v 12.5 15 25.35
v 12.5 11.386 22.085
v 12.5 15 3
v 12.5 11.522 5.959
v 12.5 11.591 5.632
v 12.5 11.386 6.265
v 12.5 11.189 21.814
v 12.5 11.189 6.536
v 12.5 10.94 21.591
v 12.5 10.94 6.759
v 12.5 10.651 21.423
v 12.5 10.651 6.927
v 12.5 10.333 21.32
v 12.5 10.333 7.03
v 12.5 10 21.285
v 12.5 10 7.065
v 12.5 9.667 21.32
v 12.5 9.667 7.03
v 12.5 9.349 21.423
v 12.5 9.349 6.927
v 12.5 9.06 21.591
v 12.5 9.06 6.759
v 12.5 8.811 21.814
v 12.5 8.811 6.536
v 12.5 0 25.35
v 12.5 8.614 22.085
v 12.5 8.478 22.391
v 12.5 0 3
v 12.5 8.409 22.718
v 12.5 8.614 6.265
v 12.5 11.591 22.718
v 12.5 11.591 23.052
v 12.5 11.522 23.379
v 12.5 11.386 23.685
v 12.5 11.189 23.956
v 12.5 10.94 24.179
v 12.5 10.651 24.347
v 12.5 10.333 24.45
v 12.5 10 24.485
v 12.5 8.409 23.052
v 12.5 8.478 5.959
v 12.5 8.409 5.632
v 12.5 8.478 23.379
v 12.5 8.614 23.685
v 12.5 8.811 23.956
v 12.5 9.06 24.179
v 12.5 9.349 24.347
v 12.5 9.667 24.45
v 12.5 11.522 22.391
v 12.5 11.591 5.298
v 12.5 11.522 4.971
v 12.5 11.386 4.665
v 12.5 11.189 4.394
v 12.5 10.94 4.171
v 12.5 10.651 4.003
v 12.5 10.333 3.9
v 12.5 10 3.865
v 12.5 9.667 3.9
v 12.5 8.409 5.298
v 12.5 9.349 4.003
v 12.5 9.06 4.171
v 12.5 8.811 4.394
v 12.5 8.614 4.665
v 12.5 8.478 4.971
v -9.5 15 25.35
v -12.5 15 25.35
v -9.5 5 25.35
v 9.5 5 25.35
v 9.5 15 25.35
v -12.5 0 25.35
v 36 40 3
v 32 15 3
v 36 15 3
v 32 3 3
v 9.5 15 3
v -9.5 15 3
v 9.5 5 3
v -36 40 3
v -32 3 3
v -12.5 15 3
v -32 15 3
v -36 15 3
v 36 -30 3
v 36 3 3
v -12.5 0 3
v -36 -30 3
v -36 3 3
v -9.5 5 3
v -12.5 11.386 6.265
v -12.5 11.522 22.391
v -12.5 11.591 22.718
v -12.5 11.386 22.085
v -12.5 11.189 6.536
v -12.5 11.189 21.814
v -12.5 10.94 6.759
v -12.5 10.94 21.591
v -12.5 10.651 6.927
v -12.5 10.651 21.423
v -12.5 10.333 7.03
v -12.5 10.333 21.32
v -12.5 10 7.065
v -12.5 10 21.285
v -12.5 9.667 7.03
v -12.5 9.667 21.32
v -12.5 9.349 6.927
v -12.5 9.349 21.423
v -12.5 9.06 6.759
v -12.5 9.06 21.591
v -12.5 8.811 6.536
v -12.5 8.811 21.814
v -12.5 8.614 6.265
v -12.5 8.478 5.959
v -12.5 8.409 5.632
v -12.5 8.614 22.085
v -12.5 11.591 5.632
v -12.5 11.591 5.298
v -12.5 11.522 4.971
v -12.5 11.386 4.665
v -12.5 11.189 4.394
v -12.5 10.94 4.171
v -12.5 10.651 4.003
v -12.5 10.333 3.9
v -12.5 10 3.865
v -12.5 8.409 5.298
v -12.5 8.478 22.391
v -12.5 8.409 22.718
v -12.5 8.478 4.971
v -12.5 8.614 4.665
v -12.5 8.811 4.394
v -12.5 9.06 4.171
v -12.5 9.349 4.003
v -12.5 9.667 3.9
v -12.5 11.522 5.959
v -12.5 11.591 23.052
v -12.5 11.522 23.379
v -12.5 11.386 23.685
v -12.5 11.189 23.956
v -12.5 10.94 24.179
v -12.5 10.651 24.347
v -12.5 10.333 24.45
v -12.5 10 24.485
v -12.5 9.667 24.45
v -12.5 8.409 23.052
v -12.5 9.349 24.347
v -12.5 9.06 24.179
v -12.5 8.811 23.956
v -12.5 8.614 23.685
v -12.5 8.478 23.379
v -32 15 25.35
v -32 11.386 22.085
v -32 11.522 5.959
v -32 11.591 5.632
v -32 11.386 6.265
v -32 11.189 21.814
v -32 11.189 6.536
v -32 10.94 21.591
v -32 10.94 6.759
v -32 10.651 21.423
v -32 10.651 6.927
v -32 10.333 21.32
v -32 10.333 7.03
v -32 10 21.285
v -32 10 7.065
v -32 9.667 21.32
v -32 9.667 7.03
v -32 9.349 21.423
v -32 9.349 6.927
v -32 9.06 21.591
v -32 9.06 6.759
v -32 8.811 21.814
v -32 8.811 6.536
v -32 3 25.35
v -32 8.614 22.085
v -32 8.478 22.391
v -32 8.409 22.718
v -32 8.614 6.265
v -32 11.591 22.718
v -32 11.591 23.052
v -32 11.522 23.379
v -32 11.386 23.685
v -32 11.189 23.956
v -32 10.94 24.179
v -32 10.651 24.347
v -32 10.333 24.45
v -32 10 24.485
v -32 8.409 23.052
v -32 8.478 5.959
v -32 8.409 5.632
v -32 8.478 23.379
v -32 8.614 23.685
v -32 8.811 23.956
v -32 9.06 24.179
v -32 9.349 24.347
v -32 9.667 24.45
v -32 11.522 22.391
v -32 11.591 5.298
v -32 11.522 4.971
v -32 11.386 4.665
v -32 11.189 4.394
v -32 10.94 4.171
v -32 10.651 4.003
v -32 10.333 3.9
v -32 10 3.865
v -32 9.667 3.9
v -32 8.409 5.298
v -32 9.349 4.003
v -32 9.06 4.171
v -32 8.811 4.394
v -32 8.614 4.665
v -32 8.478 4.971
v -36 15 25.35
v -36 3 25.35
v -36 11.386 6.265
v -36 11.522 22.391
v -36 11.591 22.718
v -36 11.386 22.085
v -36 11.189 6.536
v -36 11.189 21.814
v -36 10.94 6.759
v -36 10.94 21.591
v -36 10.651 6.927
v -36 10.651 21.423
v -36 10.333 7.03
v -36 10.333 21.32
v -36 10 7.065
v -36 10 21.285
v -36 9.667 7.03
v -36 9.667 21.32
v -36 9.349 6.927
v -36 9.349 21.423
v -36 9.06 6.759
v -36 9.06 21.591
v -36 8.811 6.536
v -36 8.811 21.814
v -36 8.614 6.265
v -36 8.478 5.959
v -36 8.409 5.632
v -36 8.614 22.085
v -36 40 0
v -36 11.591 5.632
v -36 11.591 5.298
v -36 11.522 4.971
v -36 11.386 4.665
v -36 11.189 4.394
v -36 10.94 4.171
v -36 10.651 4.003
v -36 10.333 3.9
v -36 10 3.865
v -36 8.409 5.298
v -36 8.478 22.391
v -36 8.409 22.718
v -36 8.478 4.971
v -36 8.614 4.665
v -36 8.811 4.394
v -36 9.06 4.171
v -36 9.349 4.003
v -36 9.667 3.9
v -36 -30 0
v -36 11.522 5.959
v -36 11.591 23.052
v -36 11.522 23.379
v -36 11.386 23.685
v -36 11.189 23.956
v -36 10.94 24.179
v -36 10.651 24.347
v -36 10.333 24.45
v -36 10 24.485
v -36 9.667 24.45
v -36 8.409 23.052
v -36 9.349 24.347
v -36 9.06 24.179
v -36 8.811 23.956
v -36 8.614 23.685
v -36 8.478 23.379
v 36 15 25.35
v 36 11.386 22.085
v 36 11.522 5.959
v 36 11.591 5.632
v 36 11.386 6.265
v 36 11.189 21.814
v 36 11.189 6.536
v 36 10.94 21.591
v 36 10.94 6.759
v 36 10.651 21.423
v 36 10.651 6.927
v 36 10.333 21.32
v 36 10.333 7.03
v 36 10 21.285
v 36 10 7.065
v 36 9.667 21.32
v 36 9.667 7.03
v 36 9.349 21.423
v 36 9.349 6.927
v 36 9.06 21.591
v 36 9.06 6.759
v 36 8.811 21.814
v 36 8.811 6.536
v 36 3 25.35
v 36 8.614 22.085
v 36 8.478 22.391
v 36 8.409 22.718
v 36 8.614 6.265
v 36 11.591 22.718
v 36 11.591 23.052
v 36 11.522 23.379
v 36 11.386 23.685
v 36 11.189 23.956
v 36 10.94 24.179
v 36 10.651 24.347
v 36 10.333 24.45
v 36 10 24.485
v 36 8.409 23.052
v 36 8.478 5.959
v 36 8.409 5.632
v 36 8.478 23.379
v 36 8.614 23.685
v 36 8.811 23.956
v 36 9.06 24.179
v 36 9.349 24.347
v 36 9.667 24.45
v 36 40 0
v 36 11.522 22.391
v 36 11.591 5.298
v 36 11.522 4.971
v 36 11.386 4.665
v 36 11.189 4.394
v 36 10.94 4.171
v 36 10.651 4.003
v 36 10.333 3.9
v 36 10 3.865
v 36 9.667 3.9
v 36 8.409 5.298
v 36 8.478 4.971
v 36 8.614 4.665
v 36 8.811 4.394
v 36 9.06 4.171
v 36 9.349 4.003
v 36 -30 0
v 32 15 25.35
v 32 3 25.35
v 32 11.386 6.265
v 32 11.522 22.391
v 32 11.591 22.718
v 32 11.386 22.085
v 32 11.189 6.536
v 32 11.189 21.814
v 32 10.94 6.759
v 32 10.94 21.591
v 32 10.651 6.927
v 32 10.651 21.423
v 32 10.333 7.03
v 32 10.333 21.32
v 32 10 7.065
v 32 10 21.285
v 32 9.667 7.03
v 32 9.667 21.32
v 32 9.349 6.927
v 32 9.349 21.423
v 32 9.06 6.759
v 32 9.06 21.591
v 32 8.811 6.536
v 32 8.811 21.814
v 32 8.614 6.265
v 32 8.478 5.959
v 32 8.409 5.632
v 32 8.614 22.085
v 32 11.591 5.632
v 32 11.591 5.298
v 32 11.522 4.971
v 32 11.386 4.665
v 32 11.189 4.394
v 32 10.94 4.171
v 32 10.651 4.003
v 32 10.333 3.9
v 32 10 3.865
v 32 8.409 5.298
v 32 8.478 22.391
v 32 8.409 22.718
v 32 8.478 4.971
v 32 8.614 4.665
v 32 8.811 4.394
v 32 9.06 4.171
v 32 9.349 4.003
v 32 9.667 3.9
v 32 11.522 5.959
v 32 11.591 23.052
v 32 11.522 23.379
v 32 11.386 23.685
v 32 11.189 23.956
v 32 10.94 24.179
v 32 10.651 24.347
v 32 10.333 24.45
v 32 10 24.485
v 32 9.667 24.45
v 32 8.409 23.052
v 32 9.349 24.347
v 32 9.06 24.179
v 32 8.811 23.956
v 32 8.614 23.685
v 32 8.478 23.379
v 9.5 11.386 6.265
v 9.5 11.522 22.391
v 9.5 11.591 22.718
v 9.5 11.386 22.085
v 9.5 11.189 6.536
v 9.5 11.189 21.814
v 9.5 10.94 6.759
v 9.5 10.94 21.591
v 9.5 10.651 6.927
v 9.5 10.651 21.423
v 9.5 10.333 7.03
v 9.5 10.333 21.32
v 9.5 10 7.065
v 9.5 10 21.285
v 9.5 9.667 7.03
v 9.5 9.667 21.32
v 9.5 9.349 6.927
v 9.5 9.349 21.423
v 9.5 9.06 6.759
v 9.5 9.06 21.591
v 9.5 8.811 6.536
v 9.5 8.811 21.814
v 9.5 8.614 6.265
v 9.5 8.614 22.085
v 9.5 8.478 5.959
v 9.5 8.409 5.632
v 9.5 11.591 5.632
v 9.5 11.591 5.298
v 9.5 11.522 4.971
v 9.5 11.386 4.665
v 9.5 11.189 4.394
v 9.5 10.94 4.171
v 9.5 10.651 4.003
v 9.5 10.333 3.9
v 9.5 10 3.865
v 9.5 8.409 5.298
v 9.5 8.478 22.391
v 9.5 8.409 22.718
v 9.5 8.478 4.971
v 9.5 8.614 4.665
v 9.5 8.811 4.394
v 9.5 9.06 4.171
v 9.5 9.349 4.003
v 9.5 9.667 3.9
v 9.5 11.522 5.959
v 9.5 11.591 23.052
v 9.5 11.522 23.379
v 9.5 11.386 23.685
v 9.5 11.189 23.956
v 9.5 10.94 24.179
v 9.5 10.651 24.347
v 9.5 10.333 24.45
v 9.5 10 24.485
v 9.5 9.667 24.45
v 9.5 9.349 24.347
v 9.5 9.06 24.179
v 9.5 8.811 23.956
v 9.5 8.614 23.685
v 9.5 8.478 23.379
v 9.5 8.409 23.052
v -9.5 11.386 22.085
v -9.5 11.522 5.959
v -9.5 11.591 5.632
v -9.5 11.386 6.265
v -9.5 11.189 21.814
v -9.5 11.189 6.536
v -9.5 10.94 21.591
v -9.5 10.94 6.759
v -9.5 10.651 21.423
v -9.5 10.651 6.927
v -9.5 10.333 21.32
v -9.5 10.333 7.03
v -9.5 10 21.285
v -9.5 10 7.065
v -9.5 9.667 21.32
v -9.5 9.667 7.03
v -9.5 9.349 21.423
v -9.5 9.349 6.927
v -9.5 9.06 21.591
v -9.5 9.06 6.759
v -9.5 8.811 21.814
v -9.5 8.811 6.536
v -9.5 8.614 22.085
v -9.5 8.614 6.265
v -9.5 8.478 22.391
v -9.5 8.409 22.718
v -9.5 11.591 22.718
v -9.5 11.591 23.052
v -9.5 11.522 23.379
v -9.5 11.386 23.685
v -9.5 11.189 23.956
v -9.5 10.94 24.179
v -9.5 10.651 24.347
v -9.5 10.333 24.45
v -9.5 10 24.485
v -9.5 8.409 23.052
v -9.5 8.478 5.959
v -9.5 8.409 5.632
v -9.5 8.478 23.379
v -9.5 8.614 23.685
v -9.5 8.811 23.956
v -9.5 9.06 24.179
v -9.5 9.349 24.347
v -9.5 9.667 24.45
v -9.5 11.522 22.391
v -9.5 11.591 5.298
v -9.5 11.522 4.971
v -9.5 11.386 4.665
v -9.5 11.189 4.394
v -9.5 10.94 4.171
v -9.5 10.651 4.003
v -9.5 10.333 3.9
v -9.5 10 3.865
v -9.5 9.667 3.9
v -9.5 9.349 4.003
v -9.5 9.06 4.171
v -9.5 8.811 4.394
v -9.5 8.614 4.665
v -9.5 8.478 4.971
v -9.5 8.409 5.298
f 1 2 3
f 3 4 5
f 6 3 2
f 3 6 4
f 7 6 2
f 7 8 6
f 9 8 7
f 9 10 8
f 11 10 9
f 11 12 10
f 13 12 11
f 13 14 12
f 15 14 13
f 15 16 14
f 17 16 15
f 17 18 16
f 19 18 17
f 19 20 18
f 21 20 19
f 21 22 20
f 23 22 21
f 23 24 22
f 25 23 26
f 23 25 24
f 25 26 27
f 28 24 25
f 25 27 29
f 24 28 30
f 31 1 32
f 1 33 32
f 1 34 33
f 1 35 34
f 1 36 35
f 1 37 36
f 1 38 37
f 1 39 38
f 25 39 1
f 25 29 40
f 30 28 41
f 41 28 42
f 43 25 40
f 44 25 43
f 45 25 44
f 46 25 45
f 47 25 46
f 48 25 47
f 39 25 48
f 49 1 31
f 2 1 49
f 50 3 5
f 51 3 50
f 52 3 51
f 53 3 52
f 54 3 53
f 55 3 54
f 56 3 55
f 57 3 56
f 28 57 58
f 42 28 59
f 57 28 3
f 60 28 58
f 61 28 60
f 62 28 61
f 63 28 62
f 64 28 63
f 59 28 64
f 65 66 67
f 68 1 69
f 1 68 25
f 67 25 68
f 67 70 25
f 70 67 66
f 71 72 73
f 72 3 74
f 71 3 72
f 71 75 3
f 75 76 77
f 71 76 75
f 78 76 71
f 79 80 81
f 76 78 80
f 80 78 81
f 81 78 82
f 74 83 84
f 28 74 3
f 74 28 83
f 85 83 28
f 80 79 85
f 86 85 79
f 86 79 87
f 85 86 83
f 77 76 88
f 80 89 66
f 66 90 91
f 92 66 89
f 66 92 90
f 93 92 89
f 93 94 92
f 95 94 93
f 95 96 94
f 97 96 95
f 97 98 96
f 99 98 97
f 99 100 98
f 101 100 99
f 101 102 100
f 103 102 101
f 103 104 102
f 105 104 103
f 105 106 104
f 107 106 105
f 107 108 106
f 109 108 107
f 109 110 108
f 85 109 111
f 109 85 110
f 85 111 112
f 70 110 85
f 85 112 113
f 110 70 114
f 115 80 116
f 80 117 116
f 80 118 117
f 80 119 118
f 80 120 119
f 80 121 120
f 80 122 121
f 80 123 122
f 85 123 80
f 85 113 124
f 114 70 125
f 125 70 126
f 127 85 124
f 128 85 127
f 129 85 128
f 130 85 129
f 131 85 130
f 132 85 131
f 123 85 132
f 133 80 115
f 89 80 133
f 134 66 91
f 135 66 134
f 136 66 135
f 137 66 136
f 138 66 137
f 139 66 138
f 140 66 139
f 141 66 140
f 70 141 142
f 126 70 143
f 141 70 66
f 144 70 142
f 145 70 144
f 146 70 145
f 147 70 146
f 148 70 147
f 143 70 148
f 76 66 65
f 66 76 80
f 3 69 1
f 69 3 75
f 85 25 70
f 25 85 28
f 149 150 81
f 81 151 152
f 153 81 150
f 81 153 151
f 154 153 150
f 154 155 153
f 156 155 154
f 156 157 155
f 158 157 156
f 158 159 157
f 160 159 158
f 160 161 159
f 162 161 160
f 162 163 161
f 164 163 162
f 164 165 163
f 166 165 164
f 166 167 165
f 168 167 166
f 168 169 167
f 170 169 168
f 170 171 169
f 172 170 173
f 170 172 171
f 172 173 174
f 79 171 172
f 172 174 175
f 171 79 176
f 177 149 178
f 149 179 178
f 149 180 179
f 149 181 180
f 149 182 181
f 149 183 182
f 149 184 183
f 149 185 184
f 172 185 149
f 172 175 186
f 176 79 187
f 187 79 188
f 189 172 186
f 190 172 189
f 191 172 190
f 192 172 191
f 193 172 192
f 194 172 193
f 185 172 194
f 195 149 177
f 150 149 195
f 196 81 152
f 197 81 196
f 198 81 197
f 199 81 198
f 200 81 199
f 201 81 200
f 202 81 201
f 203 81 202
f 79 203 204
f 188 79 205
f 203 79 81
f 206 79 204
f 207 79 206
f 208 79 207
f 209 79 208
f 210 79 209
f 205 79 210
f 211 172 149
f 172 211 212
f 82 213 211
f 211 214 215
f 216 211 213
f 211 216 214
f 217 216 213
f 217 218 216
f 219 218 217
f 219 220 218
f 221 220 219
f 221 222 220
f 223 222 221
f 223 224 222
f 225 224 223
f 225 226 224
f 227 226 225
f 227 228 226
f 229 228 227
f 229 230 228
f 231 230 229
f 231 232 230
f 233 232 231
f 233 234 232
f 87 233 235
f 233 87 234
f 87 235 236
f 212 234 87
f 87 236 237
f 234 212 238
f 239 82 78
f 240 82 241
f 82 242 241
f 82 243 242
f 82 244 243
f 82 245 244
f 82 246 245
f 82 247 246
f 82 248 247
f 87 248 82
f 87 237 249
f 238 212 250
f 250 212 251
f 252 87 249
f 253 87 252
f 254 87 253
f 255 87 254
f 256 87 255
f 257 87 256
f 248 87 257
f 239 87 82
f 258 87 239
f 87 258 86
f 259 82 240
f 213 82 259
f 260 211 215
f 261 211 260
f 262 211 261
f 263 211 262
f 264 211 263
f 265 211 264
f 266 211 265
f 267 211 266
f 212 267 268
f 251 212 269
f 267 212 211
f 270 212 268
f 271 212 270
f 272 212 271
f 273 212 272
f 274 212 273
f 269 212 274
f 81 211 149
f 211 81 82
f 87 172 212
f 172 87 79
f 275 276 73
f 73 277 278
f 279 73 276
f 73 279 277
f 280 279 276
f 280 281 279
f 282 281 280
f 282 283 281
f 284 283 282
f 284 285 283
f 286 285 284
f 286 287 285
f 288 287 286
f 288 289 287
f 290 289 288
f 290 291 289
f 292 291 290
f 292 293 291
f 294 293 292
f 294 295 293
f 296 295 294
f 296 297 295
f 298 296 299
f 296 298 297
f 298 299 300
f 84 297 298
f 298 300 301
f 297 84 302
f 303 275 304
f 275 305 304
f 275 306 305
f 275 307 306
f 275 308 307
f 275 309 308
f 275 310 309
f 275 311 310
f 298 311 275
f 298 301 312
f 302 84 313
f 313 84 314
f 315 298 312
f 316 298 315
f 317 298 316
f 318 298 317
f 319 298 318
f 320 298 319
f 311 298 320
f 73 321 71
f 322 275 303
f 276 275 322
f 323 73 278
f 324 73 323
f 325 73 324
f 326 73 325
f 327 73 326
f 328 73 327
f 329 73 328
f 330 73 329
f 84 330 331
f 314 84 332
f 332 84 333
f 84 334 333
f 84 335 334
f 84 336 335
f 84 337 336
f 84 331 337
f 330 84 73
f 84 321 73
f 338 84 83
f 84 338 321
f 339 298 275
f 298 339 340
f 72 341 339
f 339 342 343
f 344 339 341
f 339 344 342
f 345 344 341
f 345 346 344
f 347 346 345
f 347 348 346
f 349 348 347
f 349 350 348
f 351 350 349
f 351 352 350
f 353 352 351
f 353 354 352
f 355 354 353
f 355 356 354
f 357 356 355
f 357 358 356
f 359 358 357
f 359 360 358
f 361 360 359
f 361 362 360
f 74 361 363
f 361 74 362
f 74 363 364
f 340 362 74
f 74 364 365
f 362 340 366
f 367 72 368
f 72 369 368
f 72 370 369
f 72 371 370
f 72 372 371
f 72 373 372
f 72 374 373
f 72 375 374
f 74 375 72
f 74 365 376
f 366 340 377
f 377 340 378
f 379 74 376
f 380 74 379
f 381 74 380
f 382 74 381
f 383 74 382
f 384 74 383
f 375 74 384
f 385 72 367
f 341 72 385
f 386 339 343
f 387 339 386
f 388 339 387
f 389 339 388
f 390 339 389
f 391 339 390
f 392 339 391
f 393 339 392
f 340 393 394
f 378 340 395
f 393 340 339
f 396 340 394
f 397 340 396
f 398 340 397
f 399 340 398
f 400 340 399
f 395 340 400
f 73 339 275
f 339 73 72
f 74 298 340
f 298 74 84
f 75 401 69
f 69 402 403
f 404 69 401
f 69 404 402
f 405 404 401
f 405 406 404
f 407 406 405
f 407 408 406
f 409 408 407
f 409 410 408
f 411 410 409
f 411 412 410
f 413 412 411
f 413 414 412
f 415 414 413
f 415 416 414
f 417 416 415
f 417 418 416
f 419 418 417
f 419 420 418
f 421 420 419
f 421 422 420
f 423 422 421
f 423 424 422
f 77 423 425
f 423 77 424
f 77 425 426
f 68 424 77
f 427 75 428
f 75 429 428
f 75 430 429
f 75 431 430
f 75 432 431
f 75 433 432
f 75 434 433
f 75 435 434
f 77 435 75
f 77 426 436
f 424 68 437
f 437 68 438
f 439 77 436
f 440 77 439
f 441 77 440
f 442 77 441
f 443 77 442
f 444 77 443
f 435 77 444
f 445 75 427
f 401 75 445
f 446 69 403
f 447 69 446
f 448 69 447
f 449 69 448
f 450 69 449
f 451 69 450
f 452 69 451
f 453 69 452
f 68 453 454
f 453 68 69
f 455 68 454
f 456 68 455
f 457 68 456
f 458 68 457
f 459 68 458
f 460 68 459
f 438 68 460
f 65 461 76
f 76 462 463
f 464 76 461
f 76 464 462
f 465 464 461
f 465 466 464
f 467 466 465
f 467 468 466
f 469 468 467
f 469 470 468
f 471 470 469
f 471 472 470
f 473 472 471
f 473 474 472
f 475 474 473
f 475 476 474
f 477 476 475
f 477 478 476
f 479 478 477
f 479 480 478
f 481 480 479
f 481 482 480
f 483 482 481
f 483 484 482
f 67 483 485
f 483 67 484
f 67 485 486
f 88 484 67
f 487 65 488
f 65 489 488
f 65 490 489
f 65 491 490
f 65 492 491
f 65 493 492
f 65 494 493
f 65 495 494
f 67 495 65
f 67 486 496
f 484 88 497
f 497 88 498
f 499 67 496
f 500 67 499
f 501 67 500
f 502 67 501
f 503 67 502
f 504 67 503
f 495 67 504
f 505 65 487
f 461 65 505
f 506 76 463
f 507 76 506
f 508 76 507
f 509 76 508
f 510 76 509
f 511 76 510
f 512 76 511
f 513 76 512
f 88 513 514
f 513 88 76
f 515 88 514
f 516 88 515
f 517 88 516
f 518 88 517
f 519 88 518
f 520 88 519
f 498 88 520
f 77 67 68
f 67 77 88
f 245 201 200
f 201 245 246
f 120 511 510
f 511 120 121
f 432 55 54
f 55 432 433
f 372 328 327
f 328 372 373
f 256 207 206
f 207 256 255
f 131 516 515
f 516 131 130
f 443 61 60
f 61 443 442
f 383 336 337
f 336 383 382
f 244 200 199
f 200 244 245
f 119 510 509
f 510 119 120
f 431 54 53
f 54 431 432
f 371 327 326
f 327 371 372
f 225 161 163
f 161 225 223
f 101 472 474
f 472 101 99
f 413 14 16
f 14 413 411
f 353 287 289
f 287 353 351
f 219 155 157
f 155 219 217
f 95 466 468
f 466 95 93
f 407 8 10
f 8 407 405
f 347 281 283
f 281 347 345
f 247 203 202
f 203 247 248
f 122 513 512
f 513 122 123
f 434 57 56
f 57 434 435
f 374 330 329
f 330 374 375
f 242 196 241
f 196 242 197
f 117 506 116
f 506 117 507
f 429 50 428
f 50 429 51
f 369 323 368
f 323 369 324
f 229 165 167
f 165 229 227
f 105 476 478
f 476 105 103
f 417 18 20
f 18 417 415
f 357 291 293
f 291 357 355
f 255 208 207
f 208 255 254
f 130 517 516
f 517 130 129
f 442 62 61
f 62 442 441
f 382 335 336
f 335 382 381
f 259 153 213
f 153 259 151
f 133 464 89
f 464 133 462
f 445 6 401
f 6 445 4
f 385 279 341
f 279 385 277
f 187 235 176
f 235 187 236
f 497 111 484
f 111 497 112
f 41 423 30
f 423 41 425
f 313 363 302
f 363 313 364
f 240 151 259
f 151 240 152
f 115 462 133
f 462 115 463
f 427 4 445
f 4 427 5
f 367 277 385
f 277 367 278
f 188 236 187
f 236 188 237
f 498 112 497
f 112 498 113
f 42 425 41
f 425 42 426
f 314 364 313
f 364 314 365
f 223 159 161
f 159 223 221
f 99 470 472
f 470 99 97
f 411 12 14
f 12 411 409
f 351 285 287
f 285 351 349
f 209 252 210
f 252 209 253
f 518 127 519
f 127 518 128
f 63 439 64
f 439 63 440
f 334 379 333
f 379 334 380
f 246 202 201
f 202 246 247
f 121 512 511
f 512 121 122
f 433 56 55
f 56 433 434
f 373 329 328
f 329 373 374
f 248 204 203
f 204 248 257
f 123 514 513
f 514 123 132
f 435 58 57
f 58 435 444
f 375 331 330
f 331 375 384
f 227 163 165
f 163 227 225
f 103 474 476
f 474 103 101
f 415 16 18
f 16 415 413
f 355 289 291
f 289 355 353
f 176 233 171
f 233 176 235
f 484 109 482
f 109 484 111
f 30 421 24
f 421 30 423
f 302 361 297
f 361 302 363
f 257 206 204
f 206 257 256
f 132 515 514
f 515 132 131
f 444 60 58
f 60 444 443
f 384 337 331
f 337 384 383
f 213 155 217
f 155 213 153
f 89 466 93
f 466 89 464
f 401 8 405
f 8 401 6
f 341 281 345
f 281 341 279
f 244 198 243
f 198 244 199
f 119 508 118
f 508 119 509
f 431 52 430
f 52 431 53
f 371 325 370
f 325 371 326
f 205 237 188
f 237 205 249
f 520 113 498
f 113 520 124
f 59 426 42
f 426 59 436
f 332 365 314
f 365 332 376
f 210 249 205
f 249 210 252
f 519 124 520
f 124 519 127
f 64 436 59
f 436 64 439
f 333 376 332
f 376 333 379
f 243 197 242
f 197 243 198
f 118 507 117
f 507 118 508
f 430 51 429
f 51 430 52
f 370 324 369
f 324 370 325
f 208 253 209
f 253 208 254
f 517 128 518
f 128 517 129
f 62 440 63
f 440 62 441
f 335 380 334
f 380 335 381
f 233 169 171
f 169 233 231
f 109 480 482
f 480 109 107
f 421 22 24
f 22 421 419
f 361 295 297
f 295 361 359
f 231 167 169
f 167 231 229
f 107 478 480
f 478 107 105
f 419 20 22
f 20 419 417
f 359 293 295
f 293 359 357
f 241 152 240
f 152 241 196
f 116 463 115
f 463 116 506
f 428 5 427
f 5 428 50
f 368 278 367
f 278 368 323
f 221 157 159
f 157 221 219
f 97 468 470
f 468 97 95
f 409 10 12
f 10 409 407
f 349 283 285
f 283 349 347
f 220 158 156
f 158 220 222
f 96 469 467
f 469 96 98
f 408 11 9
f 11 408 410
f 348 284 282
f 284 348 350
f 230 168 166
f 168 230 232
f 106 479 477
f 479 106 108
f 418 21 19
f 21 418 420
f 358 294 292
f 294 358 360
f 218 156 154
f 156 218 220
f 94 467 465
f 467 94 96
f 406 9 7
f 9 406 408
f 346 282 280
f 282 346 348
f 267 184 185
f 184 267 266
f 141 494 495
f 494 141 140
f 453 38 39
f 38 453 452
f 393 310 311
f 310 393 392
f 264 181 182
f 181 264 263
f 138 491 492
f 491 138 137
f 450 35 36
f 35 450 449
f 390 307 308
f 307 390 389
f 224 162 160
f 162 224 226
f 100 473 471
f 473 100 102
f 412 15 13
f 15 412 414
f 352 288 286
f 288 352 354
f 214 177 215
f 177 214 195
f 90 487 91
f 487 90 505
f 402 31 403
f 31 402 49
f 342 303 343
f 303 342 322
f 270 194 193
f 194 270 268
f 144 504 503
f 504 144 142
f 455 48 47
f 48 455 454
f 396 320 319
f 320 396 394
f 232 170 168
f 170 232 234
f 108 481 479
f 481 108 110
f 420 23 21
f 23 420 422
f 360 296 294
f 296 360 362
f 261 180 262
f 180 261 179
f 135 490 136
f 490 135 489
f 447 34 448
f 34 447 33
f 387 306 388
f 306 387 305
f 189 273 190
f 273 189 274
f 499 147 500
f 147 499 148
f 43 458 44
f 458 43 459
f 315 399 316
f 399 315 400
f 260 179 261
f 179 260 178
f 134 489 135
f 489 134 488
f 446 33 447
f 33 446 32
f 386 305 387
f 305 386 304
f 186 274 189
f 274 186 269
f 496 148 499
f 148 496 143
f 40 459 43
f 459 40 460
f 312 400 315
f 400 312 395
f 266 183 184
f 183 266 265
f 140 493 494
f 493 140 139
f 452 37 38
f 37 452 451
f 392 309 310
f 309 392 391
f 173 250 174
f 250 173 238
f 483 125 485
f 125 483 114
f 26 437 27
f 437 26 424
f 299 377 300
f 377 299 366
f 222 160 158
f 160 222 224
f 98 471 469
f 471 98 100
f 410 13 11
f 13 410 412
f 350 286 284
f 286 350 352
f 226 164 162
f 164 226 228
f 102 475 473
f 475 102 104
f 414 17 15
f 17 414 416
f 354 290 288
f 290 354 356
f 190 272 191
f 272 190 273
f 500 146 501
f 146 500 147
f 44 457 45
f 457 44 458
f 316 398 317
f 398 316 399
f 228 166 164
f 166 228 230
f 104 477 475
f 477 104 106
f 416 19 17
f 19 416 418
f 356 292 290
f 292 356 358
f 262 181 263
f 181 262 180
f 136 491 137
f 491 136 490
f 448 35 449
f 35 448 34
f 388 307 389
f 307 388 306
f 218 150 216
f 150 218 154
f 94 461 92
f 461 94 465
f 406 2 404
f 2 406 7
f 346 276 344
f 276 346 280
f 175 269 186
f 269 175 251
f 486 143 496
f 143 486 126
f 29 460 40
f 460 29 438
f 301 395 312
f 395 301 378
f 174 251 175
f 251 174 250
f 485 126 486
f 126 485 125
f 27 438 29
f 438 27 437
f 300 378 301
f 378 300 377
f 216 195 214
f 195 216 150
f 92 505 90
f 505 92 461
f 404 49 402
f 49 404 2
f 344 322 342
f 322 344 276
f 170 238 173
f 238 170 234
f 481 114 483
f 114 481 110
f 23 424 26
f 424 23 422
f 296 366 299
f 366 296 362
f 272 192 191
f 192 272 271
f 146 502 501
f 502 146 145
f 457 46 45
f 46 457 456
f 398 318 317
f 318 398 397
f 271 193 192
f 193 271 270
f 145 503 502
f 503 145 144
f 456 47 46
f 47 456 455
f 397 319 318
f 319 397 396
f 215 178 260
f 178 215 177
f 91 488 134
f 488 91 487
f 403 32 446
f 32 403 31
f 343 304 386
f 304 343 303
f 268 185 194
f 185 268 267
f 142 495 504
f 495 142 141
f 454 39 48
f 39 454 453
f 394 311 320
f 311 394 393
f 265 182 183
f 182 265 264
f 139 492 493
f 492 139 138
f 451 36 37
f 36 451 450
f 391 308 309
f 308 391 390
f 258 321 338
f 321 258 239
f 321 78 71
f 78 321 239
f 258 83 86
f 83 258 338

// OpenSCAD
$fn=60;

//base chasis
translate([-36,-30,0])cube([72,70,3]);

//soporte motores
difference(){
union(){
translate([-12.5,0,3])cube([25,15,22.35]);
translate([-36,3,3])cube([4,12,22.35]);
translate([32,3,3])cube([4,12,22.35]);
}   
translate([-9.5,5,-10])cube([19,11,50]);
translate([0,10,5.465])rotate([0,90,0])
cylinder(d=3.2,h=100,center=true,$fn=30);
translate([0,10,22.885])rotate([0,90,0])
cylinder(d=3.2,h=100,center=true,$fn=30);
}
